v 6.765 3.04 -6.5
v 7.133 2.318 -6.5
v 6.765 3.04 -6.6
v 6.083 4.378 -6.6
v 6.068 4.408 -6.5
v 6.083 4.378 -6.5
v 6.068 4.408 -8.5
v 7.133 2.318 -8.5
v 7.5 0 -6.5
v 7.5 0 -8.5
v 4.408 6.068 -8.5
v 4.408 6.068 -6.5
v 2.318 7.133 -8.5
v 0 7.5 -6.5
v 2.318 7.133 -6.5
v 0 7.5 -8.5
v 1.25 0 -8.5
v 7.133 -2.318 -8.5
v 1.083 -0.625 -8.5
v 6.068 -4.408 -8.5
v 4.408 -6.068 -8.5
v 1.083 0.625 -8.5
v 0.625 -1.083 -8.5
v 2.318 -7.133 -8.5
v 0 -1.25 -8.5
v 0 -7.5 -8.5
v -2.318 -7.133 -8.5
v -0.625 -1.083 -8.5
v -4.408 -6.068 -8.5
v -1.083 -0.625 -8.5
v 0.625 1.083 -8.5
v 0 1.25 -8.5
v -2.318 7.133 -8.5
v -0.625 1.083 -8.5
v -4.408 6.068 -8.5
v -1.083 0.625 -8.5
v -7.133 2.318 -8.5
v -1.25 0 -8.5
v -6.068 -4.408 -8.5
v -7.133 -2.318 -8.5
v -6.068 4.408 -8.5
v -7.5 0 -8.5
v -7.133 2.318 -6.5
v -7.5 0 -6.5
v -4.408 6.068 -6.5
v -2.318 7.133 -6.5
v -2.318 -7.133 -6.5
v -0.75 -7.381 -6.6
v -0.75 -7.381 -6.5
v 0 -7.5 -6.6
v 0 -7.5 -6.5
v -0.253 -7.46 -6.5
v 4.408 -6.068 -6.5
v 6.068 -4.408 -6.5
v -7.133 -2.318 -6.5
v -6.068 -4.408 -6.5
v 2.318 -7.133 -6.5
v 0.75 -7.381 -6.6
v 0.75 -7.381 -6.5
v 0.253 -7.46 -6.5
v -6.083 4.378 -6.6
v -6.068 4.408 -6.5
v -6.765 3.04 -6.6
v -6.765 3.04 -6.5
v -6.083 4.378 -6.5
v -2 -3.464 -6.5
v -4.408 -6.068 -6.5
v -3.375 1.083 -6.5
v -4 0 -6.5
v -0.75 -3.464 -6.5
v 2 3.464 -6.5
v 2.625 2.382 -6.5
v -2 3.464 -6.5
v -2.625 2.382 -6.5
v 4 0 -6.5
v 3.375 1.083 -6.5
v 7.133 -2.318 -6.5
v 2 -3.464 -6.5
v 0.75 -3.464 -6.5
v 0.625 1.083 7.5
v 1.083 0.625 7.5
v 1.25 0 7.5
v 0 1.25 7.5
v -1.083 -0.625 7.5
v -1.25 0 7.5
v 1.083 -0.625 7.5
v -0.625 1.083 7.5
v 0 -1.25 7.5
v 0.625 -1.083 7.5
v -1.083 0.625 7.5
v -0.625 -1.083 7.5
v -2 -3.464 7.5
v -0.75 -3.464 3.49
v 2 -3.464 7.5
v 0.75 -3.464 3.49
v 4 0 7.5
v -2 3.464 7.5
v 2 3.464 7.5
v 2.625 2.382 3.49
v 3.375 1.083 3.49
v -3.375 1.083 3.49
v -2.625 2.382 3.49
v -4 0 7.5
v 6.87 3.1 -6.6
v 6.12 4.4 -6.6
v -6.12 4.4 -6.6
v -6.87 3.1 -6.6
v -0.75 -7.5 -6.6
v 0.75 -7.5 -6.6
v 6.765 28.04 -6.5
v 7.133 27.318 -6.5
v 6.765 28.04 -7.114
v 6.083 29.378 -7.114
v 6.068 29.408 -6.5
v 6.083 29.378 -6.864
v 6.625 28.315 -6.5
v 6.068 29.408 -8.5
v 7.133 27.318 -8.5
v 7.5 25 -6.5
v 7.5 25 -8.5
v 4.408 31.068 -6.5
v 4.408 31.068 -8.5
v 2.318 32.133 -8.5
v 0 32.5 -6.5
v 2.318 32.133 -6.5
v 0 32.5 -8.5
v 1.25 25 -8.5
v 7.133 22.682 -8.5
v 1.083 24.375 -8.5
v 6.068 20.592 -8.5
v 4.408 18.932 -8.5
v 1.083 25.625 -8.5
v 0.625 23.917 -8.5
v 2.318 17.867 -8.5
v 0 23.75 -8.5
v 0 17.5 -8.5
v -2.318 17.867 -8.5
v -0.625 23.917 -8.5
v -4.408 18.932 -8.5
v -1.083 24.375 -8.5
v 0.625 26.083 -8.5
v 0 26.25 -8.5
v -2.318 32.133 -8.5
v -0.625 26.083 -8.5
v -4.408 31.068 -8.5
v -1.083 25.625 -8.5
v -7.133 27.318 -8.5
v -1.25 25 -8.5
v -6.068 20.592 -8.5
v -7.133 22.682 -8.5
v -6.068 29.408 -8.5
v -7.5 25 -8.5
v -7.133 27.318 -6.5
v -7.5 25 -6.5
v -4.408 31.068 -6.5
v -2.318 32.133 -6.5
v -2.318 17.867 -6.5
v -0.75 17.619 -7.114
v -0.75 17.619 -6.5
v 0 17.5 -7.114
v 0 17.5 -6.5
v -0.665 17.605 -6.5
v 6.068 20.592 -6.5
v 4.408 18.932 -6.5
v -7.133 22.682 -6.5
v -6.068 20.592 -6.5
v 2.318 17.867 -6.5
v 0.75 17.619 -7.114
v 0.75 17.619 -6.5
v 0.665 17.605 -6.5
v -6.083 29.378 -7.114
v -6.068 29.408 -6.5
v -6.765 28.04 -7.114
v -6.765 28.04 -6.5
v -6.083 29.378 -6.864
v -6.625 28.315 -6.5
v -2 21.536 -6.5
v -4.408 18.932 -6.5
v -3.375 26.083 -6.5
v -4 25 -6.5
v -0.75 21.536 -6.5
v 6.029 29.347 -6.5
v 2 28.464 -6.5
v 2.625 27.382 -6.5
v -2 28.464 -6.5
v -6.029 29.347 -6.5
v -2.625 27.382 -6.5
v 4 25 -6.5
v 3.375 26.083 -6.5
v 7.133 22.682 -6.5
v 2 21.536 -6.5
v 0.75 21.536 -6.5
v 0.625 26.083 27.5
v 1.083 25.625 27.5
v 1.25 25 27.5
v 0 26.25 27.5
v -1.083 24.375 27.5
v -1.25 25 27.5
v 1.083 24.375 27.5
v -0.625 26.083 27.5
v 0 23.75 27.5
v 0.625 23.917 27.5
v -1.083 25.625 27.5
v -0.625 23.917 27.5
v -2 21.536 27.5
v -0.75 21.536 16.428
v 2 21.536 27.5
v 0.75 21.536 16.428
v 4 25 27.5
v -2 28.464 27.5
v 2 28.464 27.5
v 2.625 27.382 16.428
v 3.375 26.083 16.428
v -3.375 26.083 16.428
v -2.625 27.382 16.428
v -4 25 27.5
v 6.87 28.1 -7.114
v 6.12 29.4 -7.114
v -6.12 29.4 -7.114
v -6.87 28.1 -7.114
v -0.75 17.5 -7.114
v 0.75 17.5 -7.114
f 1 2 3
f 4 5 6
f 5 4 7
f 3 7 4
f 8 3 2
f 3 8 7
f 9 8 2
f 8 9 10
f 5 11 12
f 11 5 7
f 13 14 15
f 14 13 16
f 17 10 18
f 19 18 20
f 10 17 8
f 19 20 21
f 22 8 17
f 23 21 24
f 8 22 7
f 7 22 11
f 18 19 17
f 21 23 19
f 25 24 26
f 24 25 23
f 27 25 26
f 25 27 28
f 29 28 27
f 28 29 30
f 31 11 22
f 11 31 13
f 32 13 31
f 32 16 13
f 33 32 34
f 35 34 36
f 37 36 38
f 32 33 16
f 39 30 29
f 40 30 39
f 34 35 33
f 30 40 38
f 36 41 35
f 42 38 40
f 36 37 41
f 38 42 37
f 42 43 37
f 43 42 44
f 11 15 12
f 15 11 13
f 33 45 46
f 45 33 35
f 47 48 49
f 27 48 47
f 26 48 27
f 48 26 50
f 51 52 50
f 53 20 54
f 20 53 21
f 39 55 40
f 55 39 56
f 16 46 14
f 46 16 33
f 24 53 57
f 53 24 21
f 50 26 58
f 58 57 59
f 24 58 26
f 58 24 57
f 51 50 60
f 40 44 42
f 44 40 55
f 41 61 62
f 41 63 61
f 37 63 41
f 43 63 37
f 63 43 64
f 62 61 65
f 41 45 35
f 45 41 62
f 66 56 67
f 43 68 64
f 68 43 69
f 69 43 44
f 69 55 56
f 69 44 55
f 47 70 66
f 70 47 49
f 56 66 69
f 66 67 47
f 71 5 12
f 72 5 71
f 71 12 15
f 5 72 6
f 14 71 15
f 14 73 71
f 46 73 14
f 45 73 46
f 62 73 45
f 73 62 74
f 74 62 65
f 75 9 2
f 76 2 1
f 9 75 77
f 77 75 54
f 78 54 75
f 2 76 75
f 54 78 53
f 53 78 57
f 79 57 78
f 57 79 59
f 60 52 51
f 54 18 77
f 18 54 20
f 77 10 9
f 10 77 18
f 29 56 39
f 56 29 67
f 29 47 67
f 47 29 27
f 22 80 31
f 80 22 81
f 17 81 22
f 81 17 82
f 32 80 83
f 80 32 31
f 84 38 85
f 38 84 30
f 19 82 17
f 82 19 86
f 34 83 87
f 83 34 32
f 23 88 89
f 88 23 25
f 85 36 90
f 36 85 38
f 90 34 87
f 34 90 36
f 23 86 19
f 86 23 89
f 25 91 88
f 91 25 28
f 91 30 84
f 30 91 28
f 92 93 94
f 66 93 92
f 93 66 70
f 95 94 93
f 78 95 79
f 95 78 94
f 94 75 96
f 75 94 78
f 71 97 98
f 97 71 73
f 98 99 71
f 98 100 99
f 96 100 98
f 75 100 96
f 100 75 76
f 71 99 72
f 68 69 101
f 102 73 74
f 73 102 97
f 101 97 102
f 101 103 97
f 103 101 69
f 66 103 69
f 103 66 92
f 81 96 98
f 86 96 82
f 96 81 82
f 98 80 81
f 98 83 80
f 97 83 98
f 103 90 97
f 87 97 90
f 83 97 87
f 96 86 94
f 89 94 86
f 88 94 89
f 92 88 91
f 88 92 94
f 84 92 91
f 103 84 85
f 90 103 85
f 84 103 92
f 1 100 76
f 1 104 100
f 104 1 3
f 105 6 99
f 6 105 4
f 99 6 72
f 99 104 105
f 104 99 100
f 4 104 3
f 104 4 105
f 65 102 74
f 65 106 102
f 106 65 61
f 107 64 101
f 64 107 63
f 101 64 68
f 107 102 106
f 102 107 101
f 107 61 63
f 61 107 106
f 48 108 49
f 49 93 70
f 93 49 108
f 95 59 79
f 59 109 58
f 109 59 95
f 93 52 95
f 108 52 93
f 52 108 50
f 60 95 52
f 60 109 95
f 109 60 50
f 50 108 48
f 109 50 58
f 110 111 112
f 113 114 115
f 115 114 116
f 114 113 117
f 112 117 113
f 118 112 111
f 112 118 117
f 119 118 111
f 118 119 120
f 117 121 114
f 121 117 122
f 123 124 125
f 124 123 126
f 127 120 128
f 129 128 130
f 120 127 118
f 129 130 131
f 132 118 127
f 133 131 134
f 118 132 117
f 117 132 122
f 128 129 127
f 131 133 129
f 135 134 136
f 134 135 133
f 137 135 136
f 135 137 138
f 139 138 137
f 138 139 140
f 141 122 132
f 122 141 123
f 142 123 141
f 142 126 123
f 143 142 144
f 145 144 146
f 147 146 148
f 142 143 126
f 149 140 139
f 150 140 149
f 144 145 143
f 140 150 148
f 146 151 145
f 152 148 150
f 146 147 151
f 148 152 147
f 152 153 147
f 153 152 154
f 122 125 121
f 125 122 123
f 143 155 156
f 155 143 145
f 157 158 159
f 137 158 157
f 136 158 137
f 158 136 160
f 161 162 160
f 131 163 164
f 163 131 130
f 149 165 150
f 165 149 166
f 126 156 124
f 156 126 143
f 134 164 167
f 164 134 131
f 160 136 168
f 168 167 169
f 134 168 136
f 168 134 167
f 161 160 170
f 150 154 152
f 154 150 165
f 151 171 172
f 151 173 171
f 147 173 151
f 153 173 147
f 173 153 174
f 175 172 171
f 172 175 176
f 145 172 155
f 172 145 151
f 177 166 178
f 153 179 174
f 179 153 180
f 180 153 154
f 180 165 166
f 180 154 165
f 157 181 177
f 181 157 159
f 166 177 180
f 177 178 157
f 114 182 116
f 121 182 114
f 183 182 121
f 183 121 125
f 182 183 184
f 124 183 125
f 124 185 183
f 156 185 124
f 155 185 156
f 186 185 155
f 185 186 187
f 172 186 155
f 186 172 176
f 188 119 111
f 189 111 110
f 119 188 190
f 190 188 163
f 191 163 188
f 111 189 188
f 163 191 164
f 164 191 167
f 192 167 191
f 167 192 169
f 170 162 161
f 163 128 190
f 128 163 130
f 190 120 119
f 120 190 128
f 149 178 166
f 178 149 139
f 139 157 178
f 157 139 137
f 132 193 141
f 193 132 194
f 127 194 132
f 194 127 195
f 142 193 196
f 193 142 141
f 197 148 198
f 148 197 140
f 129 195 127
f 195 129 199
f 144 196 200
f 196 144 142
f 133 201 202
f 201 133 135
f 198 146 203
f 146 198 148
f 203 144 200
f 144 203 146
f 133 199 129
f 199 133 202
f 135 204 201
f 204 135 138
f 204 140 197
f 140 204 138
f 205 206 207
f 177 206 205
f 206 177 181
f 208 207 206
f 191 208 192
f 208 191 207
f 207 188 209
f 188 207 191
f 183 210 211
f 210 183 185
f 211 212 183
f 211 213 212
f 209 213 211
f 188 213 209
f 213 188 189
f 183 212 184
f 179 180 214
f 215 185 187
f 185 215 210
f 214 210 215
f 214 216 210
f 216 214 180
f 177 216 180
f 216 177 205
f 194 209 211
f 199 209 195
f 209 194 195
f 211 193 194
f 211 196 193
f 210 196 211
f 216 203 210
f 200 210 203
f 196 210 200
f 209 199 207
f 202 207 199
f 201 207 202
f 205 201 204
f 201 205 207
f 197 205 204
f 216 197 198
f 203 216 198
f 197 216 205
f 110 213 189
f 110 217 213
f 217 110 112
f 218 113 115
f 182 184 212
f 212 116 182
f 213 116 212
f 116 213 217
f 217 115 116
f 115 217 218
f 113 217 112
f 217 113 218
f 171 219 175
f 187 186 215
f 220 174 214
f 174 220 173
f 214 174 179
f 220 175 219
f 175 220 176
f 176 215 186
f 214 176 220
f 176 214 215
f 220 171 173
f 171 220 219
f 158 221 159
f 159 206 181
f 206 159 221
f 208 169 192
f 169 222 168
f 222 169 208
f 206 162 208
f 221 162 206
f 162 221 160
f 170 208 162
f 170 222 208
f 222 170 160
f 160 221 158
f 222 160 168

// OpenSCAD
// file: buttress.scad
/*
 * Written by Dermot Tynan, Kalopa Research.
 * GPLv2.
 *
 * All dimensions are in mm.
 */

/*
 * Create a buttress to reinforce a vertical column.
 * The height and length specify how high and how far out the
 * buttress goes, and the width is the width of the thing.
 */
module buttress(height, length, width)
{
	phi = atan(length / height);
	cx = length / sin(phi);
	cy = length / cos(phi);
	intersection() {
		rotate(a = [90, 90 - phi, 0])
			cube([cx, cy, width], center = true);
		translate([length/2, 0, cy*sin(phi)/2])
			cube([length, width + 2, height], center = true);
	}
}

buttress(25, 10, 2);
// main file
/*
 * Written by Dermot Tynan, Kalopa Research.
 * GPLv2.
 *
 * All dimensions are in mm.
 */

use <buttress.scad>

tap_sizes = [0, 1, 1.5, 2.5, 3.3];
post_widths = [0, 6, 6, 8, 10];
soff_base = [0, 10, 10, 15, 20];

/*
 * Create a variety of screw posts.
 * Specify the height as a parameter.
 */
module screw_post(type, height)
{
	difference() {
		cylinder(r = post_widths[type]/2, h = height, center = true);
		cylinder(r = tap_sizes[type]/2, h = height + 1, center = true, $fn = 12);
	}
}

module hex_post(type, height)
{
	difference() {
		cylinder(r = post_widths[type]/2, h = height, center = true, $fn = 6);
		cylinder(r = tap_sizes[type]/2, h = height + 1, center = true, $fn = 12);
	}
}

module so_buttress(type, height)
{
	bh = height * 0.75;
	xoff = post_widths[type]/2 - 1;
	zoff = (bh - height)/2;
	translate([xoff, 0, zoff])
		buttress(bh, soff_base[type]/2 - xoff, 1.5);
}

module standoff(type, height)
{
	union() {
		translate([0, 0, -height/2]) {
			difference() {
				cylinder(r = soff_base[type]/2, h = 2, center = true, $fn = 20);
				cylinder(r = tap_sizes[type]/2, h = 3, center = true, $fn = 12);
			}
		}
		hex_post(type, height);
		rotate(a = [0, 0, 30])
			so_buttress(type, height);
		rotate(a = [0, 0, 150])
			so_buttress(type, height);
		rotate(a = [0, 0, 270])
			so_buttress(type, height);
	}
}

h1=15;
h2=35;
standoff(3, h1);
translate([0, 25, (h2-h1)/2])
	standoff(3, h2);
